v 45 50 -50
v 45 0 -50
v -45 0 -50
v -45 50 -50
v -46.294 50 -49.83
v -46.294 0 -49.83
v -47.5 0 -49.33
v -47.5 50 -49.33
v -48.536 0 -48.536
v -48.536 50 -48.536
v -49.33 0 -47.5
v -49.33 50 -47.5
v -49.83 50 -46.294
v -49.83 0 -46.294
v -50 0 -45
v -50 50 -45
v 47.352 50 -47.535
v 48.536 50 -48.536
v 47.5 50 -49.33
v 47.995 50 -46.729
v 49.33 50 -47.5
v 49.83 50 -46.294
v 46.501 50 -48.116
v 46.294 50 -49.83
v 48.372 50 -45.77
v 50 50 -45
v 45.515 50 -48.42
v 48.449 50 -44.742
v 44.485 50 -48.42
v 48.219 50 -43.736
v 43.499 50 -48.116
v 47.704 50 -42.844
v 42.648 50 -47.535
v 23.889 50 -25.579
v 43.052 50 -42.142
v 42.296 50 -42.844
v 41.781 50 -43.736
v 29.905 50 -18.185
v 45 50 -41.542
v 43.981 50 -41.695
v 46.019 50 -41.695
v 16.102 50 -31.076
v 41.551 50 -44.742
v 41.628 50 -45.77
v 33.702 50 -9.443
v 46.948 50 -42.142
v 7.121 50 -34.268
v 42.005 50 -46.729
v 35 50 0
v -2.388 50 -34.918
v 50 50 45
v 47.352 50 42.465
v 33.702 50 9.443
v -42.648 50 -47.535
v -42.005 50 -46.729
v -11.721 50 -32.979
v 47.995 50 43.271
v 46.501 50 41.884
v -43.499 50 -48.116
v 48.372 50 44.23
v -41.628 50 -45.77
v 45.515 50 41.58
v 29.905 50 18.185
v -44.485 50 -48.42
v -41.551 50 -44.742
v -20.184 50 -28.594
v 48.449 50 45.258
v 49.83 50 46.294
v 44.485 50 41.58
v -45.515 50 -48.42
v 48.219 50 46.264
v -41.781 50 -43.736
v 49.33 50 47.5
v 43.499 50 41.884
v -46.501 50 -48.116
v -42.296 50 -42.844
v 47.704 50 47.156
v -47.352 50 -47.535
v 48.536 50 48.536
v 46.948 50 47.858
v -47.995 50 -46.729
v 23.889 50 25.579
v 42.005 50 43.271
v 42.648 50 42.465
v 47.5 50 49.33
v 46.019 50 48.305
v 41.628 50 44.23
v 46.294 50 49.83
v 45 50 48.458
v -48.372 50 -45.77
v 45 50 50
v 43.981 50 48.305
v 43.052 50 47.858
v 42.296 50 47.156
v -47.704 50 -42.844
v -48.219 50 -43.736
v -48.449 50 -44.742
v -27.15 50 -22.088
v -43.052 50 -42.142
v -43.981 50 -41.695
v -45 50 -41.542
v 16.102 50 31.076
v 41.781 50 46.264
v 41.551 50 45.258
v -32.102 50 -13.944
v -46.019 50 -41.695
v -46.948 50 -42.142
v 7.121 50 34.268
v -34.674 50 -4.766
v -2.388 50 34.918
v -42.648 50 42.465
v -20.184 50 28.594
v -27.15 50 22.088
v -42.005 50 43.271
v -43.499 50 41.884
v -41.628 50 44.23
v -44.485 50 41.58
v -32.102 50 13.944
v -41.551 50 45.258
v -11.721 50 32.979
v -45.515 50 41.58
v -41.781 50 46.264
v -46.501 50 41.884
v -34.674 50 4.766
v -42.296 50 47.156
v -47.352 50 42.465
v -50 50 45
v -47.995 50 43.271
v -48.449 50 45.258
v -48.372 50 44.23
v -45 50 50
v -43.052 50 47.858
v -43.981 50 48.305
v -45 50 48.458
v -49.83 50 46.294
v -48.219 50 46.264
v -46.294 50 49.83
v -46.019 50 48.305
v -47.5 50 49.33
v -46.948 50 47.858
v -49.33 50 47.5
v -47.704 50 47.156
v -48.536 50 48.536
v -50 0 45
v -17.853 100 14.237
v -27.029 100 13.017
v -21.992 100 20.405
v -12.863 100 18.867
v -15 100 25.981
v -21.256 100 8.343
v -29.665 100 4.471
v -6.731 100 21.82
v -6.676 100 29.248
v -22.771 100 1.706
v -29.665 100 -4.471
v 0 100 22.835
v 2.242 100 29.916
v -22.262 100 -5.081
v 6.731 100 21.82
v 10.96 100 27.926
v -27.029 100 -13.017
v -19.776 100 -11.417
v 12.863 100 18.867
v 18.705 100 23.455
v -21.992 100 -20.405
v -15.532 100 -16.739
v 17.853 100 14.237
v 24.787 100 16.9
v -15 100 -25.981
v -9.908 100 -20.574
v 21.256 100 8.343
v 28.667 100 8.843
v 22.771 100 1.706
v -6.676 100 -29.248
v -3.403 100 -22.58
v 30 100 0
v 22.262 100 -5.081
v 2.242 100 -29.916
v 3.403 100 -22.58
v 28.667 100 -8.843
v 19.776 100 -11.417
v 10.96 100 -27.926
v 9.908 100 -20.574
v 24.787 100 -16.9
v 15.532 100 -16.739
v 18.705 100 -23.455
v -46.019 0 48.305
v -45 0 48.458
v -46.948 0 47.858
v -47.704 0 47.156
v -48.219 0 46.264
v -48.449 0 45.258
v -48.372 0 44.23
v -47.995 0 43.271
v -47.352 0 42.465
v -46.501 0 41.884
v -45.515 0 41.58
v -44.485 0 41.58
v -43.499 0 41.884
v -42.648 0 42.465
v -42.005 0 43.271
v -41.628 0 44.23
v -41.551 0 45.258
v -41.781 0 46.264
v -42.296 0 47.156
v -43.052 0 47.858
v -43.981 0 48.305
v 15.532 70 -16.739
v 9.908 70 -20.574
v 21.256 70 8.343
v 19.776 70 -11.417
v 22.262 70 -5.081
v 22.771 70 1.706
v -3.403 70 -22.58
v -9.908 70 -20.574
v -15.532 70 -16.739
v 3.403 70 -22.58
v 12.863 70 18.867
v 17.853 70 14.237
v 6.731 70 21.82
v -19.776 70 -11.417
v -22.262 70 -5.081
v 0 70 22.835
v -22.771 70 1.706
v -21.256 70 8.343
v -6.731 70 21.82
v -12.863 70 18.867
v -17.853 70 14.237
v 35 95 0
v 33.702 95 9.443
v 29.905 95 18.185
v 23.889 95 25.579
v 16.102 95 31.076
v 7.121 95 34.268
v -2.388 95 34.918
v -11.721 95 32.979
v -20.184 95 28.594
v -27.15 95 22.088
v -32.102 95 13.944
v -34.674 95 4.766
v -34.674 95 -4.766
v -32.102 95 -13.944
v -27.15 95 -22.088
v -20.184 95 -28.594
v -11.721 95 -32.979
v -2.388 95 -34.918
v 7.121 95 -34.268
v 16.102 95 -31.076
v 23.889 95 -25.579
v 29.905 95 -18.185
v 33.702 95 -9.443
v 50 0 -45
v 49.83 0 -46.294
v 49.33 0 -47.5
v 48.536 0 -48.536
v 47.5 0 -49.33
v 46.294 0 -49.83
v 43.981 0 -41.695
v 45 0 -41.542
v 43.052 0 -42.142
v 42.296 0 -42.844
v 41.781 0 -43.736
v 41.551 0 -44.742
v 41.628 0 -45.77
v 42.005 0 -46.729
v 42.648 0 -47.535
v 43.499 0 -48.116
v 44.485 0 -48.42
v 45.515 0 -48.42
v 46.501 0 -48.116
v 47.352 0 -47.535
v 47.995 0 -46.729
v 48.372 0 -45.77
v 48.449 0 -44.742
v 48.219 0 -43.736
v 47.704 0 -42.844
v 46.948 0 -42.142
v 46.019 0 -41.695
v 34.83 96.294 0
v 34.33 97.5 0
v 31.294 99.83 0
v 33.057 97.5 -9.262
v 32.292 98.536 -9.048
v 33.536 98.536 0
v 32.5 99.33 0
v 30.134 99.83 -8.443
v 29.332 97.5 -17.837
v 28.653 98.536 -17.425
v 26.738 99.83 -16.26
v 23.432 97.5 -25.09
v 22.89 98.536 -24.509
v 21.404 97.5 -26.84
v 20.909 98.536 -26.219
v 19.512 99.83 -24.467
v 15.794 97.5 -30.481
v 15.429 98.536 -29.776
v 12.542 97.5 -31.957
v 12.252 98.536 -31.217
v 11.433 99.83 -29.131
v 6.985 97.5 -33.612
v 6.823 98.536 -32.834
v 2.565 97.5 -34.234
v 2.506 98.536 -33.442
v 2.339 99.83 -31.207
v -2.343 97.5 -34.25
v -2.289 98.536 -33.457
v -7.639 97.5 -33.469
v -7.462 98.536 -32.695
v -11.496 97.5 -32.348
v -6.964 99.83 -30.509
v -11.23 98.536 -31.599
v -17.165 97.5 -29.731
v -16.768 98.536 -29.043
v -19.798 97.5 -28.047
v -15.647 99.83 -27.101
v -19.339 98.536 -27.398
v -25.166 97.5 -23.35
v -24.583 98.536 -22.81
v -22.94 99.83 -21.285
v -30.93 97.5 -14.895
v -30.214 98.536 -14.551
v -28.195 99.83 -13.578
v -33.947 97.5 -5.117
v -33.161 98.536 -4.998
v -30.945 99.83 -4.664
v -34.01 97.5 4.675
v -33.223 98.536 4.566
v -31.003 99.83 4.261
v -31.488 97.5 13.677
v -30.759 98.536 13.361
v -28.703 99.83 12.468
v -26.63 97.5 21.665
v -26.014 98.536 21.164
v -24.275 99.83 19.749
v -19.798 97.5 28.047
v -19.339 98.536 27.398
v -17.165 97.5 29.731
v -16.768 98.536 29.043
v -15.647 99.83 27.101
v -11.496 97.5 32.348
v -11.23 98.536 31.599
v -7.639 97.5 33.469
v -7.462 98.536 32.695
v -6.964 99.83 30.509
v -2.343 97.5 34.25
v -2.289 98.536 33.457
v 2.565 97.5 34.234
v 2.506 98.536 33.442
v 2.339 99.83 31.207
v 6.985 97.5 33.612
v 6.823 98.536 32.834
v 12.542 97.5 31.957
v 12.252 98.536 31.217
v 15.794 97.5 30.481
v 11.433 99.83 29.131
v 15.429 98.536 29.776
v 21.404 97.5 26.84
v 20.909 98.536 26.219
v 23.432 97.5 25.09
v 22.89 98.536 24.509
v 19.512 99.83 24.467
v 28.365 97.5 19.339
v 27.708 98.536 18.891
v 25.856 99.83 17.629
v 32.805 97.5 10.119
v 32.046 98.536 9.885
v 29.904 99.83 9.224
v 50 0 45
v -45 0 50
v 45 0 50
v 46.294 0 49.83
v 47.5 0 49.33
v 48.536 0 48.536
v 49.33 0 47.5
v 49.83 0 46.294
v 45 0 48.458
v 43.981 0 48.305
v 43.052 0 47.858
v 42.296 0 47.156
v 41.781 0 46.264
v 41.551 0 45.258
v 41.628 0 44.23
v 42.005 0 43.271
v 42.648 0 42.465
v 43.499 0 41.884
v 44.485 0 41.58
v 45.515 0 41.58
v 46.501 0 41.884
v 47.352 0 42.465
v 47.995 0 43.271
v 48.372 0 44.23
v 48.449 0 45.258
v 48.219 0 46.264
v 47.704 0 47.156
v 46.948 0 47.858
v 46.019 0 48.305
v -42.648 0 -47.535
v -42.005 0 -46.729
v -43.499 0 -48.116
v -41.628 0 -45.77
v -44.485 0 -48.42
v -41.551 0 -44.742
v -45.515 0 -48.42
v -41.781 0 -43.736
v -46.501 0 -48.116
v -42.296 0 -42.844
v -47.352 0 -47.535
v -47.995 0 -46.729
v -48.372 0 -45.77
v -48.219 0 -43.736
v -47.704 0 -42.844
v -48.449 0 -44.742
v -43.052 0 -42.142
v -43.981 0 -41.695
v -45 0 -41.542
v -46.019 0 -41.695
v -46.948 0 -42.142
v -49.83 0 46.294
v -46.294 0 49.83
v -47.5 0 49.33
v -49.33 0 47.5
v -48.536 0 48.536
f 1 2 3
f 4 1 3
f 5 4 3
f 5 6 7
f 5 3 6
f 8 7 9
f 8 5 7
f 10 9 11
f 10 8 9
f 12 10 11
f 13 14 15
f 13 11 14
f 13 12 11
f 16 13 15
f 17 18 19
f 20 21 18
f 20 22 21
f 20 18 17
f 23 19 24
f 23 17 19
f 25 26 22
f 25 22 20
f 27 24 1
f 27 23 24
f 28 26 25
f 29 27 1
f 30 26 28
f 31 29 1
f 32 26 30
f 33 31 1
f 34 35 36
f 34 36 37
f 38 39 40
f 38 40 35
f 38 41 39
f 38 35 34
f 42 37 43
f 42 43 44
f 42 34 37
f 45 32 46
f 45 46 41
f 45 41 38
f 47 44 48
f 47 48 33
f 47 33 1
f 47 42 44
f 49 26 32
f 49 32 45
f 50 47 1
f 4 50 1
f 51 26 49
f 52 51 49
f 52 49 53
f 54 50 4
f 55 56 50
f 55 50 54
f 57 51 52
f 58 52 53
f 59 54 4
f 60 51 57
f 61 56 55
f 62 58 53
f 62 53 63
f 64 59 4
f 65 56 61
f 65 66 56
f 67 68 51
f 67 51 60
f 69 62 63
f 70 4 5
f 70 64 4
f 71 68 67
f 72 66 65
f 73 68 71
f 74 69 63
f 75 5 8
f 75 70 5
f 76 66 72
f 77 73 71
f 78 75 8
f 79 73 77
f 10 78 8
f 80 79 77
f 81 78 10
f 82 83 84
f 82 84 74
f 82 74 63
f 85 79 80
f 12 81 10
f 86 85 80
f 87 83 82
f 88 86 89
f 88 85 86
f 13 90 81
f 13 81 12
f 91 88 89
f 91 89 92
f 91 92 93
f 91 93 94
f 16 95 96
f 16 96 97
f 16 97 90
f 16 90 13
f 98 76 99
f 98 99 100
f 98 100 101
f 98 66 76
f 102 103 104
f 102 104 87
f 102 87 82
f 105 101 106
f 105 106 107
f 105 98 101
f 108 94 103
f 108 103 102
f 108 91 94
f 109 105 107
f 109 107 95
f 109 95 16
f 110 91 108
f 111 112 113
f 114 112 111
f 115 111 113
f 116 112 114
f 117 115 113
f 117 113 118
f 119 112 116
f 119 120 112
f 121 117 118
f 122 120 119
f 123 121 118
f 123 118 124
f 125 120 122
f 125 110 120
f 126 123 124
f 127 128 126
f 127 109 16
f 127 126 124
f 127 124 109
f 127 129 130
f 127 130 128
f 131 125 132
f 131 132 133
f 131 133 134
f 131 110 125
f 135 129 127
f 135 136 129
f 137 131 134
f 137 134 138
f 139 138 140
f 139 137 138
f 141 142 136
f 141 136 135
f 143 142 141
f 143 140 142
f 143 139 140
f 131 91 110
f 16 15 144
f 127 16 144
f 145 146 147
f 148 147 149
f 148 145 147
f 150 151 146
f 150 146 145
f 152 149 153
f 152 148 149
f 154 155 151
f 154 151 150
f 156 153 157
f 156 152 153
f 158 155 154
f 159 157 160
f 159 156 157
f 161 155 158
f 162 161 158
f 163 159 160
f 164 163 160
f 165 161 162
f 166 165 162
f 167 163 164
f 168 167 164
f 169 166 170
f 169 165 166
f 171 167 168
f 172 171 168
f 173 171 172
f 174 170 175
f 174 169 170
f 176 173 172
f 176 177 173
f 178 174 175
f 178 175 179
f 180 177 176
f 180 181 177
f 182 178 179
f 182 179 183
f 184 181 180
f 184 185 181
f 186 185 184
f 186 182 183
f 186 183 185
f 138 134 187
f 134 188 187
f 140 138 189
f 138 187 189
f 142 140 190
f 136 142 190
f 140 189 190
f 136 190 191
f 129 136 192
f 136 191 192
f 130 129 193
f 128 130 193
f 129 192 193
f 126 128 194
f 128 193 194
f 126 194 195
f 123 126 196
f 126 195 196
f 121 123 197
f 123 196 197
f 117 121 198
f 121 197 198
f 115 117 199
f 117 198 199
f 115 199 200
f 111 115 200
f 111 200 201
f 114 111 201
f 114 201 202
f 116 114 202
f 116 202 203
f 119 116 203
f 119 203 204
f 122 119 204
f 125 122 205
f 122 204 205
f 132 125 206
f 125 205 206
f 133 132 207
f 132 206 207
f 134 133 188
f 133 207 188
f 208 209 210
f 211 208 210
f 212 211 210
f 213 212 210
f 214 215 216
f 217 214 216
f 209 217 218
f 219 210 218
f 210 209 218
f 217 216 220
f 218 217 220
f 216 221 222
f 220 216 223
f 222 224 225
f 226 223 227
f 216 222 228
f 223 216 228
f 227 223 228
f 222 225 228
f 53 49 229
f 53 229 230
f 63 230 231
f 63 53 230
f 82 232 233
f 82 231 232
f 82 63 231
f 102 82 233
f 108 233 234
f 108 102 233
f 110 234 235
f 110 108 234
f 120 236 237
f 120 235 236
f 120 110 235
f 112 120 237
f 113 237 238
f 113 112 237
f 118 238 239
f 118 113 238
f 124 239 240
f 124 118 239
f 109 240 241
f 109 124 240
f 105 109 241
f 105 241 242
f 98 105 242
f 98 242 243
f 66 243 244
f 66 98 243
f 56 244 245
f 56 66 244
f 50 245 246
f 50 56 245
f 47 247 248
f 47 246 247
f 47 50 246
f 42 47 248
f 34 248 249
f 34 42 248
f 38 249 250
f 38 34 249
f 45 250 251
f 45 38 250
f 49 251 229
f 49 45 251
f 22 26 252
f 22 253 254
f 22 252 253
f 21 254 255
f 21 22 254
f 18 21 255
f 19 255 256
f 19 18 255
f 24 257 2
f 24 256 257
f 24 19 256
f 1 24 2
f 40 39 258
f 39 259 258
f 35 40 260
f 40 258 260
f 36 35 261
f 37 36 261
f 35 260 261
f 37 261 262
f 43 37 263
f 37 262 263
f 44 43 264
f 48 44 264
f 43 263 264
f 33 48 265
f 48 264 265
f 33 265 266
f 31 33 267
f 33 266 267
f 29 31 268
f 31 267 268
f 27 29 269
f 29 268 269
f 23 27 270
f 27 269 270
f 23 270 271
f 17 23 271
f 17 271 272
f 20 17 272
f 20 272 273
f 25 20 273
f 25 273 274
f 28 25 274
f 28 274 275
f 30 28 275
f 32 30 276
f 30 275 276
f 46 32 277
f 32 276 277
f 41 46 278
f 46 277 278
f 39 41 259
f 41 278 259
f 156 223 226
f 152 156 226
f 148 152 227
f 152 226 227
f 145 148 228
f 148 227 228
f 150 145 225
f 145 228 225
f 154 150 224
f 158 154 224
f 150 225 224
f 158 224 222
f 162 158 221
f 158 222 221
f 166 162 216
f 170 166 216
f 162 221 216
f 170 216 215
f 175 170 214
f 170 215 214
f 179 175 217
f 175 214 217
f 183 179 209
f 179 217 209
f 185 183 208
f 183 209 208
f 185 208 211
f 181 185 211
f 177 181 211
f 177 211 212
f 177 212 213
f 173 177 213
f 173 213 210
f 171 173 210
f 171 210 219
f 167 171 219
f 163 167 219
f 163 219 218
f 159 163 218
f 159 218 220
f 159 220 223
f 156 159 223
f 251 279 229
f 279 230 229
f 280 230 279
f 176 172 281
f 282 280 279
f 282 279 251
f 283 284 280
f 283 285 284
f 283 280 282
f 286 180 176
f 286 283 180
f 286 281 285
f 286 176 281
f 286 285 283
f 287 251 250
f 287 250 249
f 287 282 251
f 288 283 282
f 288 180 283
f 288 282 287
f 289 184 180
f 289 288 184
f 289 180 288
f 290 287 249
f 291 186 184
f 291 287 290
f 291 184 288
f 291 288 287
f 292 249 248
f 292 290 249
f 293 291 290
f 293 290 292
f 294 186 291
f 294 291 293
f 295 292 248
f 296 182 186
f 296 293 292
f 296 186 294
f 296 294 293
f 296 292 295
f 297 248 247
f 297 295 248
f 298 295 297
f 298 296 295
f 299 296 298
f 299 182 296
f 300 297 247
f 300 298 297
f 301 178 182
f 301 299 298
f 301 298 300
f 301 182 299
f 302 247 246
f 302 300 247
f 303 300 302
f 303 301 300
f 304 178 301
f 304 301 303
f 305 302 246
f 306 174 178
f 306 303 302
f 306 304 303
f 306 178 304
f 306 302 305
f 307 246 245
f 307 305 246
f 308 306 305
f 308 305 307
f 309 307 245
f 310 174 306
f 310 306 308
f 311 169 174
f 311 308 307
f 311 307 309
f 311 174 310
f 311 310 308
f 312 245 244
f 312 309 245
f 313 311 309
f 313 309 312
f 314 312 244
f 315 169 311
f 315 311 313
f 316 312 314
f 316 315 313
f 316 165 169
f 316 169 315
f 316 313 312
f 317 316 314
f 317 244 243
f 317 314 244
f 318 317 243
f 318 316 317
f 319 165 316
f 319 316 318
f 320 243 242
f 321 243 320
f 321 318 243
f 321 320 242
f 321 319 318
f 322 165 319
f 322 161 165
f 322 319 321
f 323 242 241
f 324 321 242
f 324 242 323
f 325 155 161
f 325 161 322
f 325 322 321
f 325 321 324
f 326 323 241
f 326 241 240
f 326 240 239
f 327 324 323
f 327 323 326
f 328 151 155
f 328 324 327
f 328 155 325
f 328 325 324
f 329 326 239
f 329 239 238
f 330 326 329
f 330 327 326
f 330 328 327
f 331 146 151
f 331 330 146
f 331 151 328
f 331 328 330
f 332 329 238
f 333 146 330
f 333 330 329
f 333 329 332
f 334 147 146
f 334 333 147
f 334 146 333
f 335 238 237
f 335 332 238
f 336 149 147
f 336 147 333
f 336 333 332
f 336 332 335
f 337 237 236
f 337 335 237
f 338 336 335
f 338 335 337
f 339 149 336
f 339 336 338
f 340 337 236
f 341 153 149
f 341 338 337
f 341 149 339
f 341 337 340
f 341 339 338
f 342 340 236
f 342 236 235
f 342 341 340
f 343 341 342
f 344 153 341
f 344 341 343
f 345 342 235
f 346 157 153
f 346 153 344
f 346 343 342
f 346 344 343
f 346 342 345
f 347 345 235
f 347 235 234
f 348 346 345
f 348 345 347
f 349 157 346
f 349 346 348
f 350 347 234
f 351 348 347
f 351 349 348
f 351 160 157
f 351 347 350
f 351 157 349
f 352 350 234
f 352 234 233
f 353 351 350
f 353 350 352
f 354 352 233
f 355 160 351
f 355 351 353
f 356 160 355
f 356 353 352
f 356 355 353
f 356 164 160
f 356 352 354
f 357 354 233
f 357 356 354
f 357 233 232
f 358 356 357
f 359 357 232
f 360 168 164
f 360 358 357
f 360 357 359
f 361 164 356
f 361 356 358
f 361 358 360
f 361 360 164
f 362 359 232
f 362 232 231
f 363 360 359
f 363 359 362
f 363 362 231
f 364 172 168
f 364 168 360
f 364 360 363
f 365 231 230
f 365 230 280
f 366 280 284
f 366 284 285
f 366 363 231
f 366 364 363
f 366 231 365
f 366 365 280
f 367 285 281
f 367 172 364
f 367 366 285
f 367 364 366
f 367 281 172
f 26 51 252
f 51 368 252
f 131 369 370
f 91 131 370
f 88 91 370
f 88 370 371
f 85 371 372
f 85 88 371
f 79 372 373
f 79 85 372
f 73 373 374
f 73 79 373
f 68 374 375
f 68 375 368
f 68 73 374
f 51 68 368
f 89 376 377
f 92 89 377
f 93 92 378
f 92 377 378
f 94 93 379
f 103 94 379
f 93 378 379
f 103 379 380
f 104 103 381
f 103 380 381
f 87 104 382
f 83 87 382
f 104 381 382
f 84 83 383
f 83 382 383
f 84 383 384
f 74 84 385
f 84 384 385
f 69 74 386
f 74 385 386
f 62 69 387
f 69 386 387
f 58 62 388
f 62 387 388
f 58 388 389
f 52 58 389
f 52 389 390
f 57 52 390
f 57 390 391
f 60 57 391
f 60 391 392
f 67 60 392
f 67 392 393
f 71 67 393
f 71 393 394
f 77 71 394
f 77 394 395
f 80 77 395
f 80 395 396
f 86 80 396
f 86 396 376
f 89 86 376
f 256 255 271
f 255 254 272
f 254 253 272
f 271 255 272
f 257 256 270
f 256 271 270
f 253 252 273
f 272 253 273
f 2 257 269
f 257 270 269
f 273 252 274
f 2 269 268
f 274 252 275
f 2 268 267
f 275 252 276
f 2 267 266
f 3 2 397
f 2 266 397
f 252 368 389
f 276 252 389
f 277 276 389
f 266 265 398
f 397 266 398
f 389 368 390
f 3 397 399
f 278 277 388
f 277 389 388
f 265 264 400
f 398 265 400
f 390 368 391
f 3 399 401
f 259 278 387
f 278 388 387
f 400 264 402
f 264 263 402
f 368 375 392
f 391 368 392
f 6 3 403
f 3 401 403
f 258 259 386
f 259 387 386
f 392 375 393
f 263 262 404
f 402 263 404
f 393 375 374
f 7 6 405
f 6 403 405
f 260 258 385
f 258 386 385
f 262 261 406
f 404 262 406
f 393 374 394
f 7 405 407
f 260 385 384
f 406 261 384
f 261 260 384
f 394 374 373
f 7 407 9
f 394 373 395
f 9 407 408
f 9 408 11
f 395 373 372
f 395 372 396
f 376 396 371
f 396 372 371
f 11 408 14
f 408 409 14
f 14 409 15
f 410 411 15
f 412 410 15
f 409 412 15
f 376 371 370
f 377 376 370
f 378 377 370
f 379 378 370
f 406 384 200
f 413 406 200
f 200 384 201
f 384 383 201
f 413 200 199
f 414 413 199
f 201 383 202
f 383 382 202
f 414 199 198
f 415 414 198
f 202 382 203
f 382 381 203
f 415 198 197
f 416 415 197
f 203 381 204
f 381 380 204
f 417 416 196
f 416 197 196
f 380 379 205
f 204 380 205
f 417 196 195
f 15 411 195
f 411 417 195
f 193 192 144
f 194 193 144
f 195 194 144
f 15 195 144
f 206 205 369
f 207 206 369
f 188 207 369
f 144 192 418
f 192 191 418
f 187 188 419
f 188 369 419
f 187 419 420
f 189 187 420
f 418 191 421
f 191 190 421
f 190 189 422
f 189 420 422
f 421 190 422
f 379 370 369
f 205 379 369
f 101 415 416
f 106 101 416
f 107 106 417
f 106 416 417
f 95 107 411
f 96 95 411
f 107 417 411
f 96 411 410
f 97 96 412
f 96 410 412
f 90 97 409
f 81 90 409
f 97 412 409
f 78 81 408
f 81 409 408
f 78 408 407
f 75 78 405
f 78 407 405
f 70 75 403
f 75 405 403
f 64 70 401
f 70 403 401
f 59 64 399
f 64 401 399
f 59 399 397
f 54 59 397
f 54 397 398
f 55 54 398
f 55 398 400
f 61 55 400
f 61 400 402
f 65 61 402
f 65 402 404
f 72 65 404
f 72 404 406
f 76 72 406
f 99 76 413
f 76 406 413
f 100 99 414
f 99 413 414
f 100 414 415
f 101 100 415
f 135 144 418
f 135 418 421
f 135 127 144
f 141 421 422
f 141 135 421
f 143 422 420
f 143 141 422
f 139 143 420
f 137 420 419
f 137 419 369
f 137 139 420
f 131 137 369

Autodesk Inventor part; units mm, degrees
ref_plane "YZ Plane" through (0, 0, 0) normal (1, 0, 0) x (0, 1, 0)
ref_plane "XZ Plane" through (0, 0, 0) normal (0, 1, 0) x (-1, 0, 0)
ref_plane "XY Plane" through (0, 0, 0) normal (0, 0, 1) x (1, 0, 0)
sketch "Boceto1" plane through (0, 0, 0) normal (0, 1, 0) x (-1, 0, 0)
  line L0 (50, 50) -> (-50, 50)
  line L1 (-50, 50) -> (-50, -50)
  line L2 (-50, -50) -> (50, -50)
  line L3 (50, -50) -> (50, 50)
  line L4 (50, 50) -> (-50, -50) construction
  line L5 (-50, 50) -> (50, -50) construction
  point P0 (0, 0)
  dimension "d0" = 100
  dimension "d1" = 100
sketch "Boceto2" plane through (0, 0, 0) normal (0, 1, 0) x (-1, 0, 0)
  point P0 (0, 0)
extrude "Extrusión1" add sketch "Boceto1" along normal blind 50
sketch "Boceto3" plane through (0, 50, 0) normal (0, 1, 0) x (1, 0, 0)
  line L0 (-50, 50) -> (-50, -50) projected
  line L1 (50, 50) -> (-50, 50) projected
  line L2 (50, -50) -> (50, 50) projected
  line L3 (-50, -50) -> (50, -50) projected
  point P0 (0, 0)
  point P1 (-45, -45)
  point P2 (-45, 45)
  point P3 (45, 45)
  point P4 (45, -45)
  dimension "d11" = 5
  dimension "d12" = 5
  dimension "d13" = 5
  dimension "d14" = 5
  dimension "d15" = 5
  dimension "d16" = 5
  dimension "d17" = 5
  dimension "d18" = 5
hole "Agujero1" at (-45, 50, 45) at (-45, 50, -45) at (45, 50, -45) at (45, 50, 45) direction (0, -1, 0) diameter 6.917 end through all counterbore diameter 8 counterbore depth 0 thread size "M8x1" class "6H" standard "ANSI Metric M Profile"
fillet "Empalme1" radius 5 4 edges at (-50, 25, 50) (50, 25, 50) (50, 25, -50) (-50, 25, -50)
sketch "Boceto4" plane through (0, 50, 0) normal (0, 1, 0) x (1, 0, 0)
  point P0 (0, 0)
sketch "Boceto5" plane through (0, 50, 0) normal (0, 1, 0) x (1, 0, 0)
  circle A0 centre (0, 0) radius 35
  dimension "d20" = 70
extrude "Extrusión2" add sketch "Boceto5" along normal blind 50
fillet "Empalme2" radius 5 1 edges at (-35, 100, 0)
sketch "Boceto7" plane through (0, 100, 0) normal (0, 1, 0) x (1, 0, 0)
  point P0 (0, 0)
hole "Agujero3" at (0, 100, 0) direction (0, -1, 0) diameter 45.6699 depth 30 counterbore diameter 50 counterbore depth 0 thread size "M50x4" class "6H" standard "ANSI Metric M Profile"
properties part number "Practica1Inventor"
